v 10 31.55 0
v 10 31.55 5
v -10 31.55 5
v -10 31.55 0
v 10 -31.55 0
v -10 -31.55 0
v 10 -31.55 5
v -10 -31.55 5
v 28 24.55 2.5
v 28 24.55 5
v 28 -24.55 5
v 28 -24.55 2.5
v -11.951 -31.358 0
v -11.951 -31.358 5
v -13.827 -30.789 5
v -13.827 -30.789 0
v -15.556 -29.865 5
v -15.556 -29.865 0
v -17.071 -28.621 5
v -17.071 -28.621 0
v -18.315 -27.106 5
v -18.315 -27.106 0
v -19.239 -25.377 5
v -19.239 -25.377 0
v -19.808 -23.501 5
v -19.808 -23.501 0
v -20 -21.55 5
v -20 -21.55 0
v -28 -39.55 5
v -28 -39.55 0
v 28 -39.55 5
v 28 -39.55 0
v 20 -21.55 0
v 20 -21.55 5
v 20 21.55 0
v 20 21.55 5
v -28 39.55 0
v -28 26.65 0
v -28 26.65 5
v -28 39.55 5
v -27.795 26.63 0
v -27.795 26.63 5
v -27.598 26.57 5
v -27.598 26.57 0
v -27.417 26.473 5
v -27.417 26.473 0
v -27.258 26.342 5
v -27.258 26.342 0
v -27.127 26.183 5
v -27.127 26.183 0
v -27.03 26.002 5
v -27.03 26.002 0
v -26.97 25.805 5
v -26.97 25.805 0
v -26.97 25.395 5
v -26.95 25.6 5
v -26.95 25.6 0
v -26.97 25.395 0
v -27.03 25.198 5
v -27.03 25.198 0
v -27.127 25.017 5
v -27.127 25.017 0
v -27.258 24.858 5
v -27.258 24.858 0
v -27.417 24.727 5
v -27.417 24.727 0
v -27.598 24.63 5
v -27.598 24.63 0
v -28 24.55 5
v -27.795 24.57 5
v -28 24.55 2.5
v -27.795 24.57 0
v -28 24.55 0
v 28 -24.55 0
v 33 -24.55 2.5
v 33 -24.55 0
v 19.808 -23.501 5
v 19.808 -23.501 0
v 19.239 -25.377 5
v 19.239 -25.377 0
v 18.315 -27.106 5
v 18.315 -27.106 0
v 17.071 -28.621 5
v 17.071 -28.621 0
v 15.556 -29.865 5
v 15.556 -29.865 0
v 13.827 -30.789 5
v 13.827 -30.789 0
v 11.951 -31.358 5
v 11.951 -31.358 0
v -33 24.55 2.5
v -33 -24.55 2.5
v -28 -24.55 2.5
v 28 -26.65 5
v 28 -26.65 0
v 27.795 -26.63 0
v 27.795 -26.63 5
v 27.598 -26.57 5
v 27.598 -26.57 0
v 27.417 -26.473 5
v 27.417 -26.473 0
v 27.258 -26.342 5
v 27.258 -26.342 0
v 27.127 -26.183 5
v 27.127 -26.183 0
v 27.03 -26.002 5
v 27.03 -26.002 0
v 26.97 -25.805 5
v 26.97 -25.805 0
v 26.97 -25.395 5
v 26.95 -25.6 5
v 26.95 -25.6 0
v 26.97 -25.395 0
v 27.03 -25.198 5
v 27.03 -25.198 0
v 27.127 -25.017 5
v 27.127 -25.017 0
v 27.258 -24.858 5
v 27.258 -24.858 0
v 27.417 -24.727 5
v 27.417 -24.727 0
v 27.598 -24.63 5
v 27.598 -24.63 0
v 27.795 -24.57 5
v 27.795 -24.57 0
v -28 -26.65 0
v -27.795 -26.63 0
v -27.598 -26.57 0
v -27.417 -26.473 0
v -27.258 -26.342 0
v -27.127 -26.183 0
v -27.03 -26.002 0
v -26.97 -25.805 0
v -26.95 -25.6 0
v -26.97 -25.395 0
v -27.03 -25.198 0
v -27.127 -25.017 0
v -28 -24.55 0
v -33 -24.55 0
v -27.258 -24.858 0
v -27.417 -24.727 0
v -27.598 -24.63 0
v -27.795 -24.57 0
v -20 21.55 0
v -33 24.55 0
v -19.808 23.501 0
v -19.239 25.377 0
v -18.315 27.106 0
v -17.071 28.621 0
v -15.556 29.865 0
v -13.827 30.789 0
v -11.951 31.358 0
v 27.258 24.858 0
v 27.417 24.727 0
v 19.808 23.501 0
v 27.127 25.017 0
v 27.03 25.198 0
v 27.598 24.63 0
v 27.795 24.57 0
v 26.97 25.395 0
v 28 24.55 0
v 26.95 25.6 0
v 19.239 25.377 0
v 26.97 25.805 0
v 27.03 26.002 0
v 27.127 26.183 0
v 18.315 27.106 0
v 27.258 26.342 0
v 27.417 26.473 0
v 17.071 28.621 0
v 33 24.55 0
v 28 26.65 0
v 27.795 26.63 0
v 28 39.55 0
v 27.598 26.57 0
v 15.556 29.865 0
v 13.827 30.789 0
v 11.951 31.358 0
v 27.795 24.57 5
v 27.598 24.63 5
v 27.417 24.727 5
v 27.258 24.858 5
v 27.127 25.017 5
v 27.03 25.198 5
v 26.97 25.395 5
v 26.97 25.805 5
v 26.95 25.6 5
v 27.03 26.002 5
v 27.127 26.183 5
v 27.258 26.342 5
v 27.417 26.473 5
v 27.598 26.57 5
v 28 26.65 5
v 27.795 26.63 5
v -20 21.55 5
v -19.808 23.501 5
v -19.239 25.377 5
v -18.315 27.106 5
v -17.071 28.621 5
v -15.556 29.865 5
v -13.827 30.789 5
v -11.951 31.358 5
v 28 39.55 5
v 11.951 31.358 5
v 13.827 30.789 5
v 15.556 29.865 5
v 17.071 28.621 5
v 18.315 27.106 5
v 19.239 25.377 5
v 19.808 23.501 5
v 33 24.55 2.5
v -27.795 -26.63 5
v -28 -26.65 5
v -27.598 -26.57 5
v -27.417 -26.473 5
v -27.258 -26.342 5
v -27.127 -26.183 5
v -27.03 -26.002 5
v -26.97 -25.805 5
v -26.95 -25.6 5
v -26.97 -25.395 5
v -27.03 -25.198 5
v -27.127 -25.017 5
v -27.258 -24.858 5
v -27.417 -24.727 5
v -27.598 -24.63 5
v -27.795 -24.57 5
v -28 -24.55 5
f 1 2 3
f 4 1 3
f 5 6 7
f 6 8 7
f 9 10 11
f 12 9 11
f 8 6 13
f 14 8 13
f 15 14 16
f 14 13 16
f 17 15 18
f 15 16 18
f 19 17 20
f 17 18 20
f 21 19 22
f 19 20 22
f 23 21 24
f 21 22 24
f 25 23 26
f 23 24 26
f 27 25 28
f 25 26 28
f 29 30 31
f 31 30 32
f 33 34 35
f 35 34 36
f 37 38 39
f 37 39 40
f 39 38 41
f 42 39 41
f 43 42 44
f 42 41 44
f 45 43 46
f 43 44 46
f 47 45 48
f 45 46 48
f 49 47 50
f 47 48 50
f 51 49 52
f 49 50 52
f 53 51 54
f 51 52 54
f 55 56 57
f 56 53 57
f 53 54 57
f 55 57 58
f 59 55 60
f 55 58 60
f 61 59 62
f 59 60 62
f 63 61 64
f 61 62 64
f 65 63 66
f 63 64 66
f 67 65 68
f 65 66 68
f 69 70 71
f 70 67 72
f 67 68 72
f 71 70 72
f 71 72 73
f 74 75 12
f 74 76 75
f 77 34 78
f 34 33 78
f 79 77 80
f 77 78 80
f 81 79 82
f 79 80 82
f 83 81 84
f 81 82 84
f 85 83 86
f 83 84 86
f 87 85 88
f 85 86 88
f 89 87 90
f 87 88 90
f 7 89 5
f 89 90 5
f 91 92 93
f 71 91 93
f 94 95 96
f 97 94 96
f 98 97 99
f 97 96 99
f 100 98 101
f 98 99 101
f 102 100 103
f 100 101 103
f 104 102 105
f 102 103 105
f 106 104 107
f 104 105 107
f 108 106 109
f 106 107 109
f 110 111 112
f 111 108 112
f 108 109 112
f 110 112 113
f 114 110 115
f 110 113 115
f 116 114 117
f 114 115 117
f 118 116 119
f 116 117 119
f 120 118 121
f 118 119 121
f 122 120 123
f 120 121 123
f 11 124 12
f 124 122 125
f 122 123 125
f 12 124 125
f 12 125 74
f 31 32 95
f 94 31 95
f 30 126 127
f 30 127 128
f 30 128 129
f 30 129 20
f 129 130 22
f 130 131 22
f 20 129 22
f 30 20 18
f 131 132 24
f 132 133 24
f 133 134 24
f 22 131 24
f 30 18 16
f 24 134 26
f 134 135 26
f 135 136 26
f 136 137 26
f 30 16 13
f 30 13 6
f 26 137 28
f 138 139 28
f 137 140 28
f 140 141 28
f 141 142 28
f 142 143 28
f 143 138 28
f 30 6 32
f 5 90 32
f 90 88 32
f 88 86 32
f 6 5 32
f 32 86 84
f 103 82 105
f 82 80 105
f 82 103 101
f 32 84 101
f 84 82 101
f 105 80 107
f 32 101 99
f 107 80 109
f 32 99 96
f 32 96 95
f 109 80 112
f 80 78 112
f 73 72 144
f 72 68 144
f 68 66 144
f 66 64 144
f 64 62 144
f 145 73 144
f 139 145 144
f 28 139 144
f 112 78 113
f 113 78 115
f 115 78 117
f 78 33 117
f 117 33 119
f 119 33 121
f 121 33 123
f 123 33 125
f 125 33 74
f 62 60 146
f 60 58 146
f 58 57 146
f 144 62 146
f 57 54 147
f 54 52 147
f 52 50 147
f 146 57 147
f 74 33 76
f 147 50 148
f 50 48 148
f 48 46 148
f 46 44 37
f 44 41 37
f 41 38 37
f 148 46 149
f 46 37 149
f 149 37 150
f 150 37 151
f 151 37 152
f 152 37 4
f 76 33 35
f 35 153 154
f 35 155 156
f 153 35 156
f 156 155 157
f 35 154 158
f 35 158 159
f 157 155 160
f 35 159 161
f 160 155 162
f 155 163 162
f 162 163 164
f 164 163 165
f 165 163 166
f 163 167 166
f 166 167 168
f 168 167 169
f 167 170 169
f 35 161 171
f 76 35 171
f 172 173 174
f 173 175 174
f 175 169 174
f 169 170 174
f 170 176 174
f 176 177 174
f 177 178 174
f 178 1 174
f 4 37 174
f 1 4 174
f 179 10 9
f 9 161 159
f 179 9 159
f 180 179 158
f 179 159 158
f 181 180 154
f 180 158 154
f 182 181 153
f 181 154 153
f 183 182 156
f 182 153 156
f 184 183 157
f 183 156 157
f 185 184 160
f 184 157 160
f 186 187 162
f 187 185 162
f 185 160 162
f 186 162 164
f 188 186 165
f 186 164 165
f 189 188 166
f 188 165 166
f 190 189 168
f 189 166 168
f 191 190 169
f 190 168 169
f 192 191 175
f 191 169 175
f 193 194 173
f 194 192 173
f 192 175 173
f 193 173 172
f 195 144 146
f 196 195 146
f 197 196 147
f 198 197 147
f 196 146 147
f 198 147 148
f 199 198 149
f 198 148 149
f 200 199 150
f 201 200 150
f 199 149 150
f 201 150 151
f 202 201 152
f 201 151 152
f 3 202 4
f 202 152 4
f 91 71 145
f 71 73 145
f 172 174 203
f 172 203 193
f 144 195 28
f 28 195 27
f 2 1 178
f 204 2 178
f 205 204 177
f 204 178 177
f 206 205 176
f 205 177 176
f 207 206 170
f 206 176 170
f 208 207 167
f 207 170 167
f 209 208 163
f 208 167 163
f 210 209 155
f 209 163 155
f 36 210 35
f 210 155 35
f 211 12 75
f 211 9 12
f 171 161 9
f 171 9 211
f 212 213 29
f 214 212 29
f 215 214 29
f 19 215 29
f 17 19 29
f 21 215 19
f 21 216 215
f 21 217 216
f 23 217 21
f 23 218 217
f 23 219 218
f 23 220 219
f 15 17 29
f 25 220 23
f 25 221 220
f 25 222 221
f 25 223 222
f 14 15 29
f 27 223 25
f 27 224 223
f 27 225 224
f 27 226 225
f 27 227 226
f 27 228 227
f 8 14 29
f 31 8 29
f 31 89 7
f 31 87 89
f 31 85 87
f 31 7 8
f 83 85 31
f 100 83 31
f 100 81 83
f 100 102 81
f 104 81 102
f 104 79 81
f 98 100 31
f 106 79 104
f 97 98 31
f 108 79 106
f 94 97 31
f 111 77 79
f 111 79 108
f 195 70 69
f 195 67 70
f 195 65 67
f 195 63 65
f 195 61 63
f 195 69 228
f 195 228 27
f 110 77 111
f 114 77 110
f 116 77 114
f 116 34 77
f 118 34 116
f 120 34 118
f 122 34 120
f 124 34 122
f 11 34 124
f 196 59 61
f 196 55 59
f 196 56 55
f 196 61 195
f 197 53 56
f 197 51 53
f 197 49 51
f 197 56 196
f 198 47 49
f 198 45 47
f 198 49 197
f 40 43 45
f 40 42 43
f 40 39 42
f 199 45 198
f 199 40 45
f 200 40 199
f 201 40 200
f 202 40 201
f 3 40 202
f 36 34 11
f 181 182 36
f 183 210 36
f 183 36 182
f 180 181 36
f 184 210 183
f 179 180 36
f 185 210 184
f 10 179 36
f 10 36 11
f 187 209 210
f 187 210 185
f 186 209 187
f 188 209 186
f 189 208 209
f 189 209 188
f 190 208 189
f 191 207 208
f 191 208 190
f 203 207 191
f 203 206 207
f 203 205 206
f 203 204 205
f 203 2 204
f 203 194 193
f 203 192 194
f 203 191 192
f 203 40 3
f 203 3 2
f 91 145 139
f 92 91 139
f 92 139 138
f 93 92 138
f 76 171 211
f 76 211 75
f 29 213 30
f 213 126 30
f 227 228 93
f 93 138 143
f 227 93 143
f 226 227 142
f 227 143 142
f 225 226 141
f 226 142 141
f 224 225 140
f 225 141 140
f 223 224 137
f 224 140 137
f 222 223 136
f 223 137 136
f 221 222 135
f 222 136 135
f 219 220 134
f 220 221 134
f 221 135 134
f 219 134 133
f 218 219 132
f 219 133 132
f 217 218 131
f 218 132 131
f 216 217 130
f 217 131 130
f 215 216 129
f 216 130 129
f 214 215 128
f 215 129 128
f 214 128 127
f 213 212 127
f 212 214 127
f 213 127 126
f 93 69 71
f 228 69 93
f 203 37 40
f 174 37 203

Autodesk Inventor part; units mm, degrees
ref_plane "YZ Plane" through (0, 0, 0) normal (1, 0, 0) x (0, 1, 0)
ref_plane "XZ Plane" through (0, 0, 0) normal (0, 1, 0) x (-1, 0, 0)
ref_plane "XY Plane" through (0, 0, 0) normal (0, 0, 1) x (1, 0, 0)
sketch "スケッチ1" plane through (0, 0, 0) normal (0, 0, 1) x (1, 0, 0)
  line L0 (-28, -39.55) -> (28, -39.55) construction
  line L1 (28, -39.55) -> (28, 39.55) construction
  line L2 (28, 39.55) -> (-28, 39.55) construction
  line L3 (-28, 39.55) -> (-28, -39.55) construction
  line L4 (-28, -39.55) -> (28, 39.55) construction
  line L5 (28, -39.55) -> (-28, 39.55) construction
  line L6 (-28, 26.65) -> (-28, 39.55)
  line L7 (-28, 39.55) -> (28, 39.55)
  line L8 (28, 39.55) -> (28, 26.65)
  line L9 (-28, 24.55) -> (-33, 24.55)
  line L10 (-33, 24.55) -> (-33, -24.55)
  line L11 (-33, -24.55) -> (-28, -24.55)
  line L12 (-28, -26.65) -> (-28, -39.55)
  line L13 (-28, -39.55) -> (28, -39.55)
  line L14 (28, -39.55) -> (28, -26.65)
  line L15 (28, 24.55) -> (33, 24.55)
  line L16 (33, 24.55) -> (33, -24.55)
  line L17 (33, -24.55) -> (28, -24.55)
  arc A0 (-28, 24.55) -> (-28, 26.65) centre (-28, 25.6) ccw
  arc A1 (-28, -26.65) -> (-28, -24.55) centre (-28, -25.6) ccw
  arc A2 (28, -24.55) -> (28, -26.65) centre (28, -25.6) ccw
  line L18 (0, 0) -> (0, 39.55) construction
  line L19 (0, 0) -> (28, 0) construction
  arc A3 (28, 26.65) -> (28, 24.55) centre (28, 25.6) ccw
  dimension "d9" = 56
  dimension "d12" = 79.1
  dimension "d13" = 15
  dimension "d39" = 15
  dimension "d40" = 1.05
  dimension "d41" = 5
extrude "押し出し1" add sketch "スケッチ1" along normal blind 5
sketch "スケッチ2" plane through (0, 0, 5) normal (0, 0, 1) x (1, 0, 0)
  line L0 (-28, 39.55) -> (-28, 26.65) projected
  line L1 (28, 39.55) -> (-28, 39.55) projected
  line L2 (-67.7785, 43.014) -> (-28, 43.014)
  line L3 (-28, 43.014) -> (-28, -43.014)
  line L4 (-28, -43.014) -> (-67.7785, -43.014)
  line L5 (-67.7785, -43.014) -> (-67.7785, 43.014)
  line L6 (67.7785, 43.014) -> (28, 43.014)
  line L7 (28, 43.014) -> (28, -43.014)
  line L8 (28, -43.014) -> (67.7785, -43.014)
  line L9 (67.7785, -43.014) -> (67.7785, 43.014)
  line L10 (0, 0) -> (0, 39.55) construction
  line L11 (0, 0) -> (33, 0) construction
  line L12 (33, 24.55) -> (33, -24.55) construction
extrude "押し出し2" cut sketch "スケッチ2" against normal blind 2.5
sketch "スケッチ3" plane through (0, 0, 5) normal (0, 0, 1) x (1, 0, 0)
  line L0 (28, 39.55) -> (-28, 39.55) projected
  line L1 (-28, 39.55) -> (-28, 26.65) projected
  line L2 (-20, -31.55) -> (20, -31.55)
  line L3 (20, -31.55) -> (20, 31.55)
  line L4 (20, 31.55) -> (-20, 31.55)
  line L5 (-20, 31.55) -> (-20, -31.55)
  line L6 (-20, -31.55) -> (20, 31.55) construction
  line L7 (20, -31.55) -> (-20, 31.55) construction
  point P0 (0, 0)
  dimension "d47" = 8
  dimension "d48" = 8
extrude "押し出し3" cut sketch "スケッチ3" against normal blind 10
fillet "フィレット1" radius 10 4 edges at (-20, 31.55, 2.5) (20, 31.55, 2.5) (20, -31.55, 2.5) (-20, -31.55, 2.5)
equation "\"d12\" = d18"
equation "\"d13\" = d28"
equation "\"d39\" = d13"
equation "\"d47\" = d48"
equation "\"d18\" = 79.1"
equation "\"d28\" = 15"
properties part number "コックピット_2_サブフレーム_1" material "アセタール樹脂、黒"
